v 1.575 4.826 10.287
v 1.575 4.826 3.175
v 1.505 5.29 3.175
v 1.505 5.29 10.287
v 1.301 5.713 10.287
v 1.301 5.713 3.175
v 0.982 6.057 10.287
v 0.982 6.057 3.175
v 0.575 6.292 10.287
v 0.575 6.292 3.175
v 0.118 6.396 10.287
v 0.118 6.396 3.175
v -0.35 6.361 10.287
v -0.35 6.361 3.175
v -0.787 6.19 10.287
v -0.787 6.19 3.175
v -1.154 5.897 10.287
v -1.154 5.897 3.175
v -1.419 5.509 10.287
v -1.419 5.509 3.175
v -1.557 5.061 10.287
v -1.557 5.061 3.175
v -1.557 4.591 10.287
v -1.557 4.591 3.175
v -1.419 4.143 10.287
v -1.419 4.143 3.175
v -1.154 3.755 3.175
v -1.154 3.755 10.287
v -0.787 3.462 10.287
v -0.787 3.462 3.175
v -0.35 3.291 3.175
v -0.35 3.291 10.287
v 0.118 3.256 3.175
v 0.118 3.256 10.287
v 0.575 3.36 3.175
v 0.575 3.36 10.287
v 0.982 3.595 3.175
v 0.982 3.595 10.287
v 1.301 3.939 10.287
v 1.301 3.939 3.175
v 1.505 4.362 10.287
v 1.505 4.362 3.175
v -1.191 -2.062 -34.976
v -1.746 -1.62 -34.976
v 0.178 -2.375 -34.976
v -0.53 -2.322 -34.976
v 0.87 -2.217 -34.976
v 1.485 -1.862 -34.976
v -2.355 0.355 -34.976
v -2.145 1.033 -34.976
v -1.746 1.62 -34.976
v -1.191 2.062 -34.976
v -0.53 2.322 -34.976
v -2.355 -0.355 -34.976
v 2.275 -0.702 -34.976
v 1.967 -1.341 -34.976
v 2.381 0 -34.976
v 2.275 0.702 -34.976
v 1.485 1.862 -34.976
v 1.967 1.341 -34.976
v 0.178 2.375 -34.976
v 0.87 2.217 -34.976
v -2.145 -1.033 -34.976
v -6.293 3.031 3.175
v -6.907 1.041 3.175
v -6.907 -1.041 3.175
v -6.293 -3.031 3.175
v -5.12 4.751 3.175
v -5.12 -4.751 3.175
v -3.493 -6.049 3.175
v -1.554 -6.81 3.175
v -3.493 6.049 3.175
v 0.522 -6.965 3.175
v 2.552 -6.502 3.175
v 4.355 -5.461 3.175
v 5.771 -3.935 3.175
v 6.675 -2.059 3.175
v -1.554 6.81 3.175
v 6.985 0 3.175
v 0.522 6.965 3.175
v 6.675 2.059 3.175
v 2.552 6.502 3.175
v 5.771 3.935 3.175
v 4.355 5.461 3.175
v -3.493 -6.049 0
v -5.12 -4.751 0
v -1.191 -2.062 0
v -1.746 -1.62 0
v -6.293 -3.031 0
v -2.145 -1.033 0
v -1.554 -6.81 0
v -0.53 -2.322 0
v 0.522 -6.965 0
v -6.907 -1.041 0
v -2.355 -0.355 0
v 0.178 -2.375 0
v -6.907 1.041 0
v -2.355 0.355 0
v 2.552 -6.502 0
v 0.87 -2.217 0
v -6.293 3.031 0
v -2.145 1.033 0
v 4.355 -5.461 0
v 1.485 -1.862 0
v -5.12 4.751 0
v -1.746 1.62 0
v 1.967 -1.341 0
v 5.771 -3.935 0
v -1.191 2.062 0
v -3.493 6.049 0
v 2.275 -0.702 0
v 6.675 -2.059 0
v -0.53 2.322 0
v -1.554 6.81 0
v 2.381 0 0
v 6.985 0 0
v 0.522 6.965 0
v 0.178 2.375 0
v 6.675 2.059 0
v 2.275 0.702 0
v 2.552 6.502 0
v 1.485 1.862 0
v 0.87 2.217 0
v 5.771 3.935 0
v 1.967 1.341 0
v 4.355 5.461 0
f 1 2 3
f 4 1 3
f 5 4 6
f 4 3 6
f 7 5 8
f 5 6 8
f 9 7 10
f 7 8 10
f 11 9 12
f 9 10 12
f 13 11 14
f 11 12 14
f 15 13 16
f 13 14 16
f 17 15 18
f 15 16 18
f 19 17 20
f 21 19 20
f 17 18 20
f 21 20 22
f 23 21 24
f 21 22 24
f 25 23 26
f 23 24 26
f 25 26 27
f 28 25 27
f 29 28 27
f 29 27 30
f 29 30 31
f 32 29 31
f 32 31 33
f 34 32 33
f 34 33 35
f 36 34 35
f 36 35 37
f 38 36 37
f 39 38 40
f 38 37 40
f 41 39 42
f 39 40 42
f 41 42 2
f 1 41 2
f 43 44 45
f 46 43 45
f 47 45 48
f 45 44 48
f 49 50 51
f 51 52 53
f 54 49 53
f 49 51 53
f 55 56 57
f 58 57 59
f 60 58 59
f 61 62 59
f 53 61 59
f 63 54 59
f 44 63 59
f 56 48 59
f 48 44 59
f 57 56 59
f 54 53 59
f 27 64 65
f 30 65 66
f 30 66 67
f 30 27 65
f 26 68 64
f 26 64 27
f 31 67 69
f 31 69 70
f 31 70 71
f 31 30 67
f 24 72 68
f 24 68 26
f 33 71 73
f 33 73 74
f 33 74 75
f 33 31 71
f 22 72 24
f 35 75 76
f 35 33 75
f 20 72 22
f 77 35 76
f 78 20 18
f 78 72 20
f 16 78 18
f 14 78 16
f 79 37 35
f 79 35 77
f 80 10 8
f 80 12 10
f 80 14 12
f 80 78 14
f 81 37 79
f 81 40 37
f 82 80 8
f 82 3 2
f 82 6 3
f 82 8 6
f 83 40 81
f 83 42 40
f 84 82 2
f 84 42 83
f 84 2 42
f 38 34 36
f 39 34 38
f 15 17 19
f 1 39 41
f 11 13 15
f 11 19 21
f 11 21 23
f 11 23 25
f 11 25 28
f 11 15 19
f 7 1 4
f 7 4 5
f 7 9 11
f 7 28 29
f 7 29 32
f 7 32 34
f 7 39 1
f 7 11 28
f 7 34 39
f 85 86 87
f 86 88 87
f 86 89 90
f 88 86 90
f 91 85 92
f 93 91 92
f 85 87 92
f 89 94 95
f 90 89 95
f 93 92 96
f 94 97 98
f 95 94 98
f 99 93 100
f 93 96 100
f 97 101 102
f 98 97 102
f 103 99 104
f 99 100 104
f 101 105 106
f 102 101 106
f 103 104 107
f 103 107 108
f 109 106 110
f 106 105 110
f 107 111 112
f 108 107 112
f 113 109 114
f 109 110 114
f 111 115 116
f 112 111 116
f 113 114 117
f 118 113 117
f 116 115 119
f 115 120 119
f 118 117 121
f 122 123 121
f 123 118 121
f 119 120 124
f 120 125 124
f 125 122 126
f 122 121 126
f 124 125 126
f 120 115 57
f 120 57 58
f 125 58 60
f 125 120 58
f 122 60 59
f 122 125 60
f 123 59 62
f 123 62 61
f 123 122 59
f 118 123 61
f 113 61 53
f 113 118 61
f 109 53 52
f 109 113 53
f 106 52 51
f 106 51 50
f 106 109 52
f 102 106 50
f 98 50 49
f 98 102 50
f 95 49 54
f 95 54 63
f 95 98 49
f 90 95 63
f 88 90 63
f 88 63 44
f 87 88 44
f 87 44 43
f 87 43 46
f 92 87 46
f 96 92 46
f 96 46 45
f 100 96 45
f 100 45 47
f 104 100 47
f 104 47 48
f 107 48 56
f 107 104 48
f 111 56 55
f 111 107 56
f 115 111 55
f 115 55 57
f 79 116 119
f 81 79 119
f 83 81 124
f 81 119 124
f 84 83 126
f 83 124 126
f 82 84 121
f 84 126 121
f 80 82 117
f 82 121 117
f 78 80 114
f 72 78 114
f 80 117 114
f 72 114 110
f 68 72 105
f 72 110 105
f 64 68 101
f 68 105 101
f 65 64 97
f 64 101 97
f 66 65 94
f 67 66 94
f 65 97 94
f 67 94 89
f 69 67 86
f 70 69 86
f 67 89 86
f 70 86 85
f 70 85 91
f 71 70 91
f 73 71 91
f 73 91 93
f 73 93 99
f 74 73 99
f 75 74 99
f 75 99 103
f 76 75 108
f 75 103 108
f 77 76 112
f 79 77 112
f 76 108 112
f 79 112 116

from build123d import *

# Parameters (mm, degrees)
F0_R     = 6.985
F1_DEPTH = 3.175
F2_R     = 2.38125
F3_DEPTH = 34.9758
F4_R     = 1.5748
F5_DEPTH = 7.112


with BuildPart() as f1:
    # F0 (on Top) → F1 (new body)
    with BuildSketch(Plane.XY):
        Circle(F0_R)
    extrude(amount=F1_DEPTH)

    # F2 (on face) → F3 (join)
    with BuildSketch(Plane.XY):
        Circle(F2_R)
    extrude(amount=-F3_DEPTH)

    # F4 (on face) → F5 (join)
    with BuildSketch(Plane.XY.offset(3.175)):
        with Locations((0, 4.826)):
            Circle(F4_R)
    extrude(amount=F5_DEPTH)


solid = f1.part
